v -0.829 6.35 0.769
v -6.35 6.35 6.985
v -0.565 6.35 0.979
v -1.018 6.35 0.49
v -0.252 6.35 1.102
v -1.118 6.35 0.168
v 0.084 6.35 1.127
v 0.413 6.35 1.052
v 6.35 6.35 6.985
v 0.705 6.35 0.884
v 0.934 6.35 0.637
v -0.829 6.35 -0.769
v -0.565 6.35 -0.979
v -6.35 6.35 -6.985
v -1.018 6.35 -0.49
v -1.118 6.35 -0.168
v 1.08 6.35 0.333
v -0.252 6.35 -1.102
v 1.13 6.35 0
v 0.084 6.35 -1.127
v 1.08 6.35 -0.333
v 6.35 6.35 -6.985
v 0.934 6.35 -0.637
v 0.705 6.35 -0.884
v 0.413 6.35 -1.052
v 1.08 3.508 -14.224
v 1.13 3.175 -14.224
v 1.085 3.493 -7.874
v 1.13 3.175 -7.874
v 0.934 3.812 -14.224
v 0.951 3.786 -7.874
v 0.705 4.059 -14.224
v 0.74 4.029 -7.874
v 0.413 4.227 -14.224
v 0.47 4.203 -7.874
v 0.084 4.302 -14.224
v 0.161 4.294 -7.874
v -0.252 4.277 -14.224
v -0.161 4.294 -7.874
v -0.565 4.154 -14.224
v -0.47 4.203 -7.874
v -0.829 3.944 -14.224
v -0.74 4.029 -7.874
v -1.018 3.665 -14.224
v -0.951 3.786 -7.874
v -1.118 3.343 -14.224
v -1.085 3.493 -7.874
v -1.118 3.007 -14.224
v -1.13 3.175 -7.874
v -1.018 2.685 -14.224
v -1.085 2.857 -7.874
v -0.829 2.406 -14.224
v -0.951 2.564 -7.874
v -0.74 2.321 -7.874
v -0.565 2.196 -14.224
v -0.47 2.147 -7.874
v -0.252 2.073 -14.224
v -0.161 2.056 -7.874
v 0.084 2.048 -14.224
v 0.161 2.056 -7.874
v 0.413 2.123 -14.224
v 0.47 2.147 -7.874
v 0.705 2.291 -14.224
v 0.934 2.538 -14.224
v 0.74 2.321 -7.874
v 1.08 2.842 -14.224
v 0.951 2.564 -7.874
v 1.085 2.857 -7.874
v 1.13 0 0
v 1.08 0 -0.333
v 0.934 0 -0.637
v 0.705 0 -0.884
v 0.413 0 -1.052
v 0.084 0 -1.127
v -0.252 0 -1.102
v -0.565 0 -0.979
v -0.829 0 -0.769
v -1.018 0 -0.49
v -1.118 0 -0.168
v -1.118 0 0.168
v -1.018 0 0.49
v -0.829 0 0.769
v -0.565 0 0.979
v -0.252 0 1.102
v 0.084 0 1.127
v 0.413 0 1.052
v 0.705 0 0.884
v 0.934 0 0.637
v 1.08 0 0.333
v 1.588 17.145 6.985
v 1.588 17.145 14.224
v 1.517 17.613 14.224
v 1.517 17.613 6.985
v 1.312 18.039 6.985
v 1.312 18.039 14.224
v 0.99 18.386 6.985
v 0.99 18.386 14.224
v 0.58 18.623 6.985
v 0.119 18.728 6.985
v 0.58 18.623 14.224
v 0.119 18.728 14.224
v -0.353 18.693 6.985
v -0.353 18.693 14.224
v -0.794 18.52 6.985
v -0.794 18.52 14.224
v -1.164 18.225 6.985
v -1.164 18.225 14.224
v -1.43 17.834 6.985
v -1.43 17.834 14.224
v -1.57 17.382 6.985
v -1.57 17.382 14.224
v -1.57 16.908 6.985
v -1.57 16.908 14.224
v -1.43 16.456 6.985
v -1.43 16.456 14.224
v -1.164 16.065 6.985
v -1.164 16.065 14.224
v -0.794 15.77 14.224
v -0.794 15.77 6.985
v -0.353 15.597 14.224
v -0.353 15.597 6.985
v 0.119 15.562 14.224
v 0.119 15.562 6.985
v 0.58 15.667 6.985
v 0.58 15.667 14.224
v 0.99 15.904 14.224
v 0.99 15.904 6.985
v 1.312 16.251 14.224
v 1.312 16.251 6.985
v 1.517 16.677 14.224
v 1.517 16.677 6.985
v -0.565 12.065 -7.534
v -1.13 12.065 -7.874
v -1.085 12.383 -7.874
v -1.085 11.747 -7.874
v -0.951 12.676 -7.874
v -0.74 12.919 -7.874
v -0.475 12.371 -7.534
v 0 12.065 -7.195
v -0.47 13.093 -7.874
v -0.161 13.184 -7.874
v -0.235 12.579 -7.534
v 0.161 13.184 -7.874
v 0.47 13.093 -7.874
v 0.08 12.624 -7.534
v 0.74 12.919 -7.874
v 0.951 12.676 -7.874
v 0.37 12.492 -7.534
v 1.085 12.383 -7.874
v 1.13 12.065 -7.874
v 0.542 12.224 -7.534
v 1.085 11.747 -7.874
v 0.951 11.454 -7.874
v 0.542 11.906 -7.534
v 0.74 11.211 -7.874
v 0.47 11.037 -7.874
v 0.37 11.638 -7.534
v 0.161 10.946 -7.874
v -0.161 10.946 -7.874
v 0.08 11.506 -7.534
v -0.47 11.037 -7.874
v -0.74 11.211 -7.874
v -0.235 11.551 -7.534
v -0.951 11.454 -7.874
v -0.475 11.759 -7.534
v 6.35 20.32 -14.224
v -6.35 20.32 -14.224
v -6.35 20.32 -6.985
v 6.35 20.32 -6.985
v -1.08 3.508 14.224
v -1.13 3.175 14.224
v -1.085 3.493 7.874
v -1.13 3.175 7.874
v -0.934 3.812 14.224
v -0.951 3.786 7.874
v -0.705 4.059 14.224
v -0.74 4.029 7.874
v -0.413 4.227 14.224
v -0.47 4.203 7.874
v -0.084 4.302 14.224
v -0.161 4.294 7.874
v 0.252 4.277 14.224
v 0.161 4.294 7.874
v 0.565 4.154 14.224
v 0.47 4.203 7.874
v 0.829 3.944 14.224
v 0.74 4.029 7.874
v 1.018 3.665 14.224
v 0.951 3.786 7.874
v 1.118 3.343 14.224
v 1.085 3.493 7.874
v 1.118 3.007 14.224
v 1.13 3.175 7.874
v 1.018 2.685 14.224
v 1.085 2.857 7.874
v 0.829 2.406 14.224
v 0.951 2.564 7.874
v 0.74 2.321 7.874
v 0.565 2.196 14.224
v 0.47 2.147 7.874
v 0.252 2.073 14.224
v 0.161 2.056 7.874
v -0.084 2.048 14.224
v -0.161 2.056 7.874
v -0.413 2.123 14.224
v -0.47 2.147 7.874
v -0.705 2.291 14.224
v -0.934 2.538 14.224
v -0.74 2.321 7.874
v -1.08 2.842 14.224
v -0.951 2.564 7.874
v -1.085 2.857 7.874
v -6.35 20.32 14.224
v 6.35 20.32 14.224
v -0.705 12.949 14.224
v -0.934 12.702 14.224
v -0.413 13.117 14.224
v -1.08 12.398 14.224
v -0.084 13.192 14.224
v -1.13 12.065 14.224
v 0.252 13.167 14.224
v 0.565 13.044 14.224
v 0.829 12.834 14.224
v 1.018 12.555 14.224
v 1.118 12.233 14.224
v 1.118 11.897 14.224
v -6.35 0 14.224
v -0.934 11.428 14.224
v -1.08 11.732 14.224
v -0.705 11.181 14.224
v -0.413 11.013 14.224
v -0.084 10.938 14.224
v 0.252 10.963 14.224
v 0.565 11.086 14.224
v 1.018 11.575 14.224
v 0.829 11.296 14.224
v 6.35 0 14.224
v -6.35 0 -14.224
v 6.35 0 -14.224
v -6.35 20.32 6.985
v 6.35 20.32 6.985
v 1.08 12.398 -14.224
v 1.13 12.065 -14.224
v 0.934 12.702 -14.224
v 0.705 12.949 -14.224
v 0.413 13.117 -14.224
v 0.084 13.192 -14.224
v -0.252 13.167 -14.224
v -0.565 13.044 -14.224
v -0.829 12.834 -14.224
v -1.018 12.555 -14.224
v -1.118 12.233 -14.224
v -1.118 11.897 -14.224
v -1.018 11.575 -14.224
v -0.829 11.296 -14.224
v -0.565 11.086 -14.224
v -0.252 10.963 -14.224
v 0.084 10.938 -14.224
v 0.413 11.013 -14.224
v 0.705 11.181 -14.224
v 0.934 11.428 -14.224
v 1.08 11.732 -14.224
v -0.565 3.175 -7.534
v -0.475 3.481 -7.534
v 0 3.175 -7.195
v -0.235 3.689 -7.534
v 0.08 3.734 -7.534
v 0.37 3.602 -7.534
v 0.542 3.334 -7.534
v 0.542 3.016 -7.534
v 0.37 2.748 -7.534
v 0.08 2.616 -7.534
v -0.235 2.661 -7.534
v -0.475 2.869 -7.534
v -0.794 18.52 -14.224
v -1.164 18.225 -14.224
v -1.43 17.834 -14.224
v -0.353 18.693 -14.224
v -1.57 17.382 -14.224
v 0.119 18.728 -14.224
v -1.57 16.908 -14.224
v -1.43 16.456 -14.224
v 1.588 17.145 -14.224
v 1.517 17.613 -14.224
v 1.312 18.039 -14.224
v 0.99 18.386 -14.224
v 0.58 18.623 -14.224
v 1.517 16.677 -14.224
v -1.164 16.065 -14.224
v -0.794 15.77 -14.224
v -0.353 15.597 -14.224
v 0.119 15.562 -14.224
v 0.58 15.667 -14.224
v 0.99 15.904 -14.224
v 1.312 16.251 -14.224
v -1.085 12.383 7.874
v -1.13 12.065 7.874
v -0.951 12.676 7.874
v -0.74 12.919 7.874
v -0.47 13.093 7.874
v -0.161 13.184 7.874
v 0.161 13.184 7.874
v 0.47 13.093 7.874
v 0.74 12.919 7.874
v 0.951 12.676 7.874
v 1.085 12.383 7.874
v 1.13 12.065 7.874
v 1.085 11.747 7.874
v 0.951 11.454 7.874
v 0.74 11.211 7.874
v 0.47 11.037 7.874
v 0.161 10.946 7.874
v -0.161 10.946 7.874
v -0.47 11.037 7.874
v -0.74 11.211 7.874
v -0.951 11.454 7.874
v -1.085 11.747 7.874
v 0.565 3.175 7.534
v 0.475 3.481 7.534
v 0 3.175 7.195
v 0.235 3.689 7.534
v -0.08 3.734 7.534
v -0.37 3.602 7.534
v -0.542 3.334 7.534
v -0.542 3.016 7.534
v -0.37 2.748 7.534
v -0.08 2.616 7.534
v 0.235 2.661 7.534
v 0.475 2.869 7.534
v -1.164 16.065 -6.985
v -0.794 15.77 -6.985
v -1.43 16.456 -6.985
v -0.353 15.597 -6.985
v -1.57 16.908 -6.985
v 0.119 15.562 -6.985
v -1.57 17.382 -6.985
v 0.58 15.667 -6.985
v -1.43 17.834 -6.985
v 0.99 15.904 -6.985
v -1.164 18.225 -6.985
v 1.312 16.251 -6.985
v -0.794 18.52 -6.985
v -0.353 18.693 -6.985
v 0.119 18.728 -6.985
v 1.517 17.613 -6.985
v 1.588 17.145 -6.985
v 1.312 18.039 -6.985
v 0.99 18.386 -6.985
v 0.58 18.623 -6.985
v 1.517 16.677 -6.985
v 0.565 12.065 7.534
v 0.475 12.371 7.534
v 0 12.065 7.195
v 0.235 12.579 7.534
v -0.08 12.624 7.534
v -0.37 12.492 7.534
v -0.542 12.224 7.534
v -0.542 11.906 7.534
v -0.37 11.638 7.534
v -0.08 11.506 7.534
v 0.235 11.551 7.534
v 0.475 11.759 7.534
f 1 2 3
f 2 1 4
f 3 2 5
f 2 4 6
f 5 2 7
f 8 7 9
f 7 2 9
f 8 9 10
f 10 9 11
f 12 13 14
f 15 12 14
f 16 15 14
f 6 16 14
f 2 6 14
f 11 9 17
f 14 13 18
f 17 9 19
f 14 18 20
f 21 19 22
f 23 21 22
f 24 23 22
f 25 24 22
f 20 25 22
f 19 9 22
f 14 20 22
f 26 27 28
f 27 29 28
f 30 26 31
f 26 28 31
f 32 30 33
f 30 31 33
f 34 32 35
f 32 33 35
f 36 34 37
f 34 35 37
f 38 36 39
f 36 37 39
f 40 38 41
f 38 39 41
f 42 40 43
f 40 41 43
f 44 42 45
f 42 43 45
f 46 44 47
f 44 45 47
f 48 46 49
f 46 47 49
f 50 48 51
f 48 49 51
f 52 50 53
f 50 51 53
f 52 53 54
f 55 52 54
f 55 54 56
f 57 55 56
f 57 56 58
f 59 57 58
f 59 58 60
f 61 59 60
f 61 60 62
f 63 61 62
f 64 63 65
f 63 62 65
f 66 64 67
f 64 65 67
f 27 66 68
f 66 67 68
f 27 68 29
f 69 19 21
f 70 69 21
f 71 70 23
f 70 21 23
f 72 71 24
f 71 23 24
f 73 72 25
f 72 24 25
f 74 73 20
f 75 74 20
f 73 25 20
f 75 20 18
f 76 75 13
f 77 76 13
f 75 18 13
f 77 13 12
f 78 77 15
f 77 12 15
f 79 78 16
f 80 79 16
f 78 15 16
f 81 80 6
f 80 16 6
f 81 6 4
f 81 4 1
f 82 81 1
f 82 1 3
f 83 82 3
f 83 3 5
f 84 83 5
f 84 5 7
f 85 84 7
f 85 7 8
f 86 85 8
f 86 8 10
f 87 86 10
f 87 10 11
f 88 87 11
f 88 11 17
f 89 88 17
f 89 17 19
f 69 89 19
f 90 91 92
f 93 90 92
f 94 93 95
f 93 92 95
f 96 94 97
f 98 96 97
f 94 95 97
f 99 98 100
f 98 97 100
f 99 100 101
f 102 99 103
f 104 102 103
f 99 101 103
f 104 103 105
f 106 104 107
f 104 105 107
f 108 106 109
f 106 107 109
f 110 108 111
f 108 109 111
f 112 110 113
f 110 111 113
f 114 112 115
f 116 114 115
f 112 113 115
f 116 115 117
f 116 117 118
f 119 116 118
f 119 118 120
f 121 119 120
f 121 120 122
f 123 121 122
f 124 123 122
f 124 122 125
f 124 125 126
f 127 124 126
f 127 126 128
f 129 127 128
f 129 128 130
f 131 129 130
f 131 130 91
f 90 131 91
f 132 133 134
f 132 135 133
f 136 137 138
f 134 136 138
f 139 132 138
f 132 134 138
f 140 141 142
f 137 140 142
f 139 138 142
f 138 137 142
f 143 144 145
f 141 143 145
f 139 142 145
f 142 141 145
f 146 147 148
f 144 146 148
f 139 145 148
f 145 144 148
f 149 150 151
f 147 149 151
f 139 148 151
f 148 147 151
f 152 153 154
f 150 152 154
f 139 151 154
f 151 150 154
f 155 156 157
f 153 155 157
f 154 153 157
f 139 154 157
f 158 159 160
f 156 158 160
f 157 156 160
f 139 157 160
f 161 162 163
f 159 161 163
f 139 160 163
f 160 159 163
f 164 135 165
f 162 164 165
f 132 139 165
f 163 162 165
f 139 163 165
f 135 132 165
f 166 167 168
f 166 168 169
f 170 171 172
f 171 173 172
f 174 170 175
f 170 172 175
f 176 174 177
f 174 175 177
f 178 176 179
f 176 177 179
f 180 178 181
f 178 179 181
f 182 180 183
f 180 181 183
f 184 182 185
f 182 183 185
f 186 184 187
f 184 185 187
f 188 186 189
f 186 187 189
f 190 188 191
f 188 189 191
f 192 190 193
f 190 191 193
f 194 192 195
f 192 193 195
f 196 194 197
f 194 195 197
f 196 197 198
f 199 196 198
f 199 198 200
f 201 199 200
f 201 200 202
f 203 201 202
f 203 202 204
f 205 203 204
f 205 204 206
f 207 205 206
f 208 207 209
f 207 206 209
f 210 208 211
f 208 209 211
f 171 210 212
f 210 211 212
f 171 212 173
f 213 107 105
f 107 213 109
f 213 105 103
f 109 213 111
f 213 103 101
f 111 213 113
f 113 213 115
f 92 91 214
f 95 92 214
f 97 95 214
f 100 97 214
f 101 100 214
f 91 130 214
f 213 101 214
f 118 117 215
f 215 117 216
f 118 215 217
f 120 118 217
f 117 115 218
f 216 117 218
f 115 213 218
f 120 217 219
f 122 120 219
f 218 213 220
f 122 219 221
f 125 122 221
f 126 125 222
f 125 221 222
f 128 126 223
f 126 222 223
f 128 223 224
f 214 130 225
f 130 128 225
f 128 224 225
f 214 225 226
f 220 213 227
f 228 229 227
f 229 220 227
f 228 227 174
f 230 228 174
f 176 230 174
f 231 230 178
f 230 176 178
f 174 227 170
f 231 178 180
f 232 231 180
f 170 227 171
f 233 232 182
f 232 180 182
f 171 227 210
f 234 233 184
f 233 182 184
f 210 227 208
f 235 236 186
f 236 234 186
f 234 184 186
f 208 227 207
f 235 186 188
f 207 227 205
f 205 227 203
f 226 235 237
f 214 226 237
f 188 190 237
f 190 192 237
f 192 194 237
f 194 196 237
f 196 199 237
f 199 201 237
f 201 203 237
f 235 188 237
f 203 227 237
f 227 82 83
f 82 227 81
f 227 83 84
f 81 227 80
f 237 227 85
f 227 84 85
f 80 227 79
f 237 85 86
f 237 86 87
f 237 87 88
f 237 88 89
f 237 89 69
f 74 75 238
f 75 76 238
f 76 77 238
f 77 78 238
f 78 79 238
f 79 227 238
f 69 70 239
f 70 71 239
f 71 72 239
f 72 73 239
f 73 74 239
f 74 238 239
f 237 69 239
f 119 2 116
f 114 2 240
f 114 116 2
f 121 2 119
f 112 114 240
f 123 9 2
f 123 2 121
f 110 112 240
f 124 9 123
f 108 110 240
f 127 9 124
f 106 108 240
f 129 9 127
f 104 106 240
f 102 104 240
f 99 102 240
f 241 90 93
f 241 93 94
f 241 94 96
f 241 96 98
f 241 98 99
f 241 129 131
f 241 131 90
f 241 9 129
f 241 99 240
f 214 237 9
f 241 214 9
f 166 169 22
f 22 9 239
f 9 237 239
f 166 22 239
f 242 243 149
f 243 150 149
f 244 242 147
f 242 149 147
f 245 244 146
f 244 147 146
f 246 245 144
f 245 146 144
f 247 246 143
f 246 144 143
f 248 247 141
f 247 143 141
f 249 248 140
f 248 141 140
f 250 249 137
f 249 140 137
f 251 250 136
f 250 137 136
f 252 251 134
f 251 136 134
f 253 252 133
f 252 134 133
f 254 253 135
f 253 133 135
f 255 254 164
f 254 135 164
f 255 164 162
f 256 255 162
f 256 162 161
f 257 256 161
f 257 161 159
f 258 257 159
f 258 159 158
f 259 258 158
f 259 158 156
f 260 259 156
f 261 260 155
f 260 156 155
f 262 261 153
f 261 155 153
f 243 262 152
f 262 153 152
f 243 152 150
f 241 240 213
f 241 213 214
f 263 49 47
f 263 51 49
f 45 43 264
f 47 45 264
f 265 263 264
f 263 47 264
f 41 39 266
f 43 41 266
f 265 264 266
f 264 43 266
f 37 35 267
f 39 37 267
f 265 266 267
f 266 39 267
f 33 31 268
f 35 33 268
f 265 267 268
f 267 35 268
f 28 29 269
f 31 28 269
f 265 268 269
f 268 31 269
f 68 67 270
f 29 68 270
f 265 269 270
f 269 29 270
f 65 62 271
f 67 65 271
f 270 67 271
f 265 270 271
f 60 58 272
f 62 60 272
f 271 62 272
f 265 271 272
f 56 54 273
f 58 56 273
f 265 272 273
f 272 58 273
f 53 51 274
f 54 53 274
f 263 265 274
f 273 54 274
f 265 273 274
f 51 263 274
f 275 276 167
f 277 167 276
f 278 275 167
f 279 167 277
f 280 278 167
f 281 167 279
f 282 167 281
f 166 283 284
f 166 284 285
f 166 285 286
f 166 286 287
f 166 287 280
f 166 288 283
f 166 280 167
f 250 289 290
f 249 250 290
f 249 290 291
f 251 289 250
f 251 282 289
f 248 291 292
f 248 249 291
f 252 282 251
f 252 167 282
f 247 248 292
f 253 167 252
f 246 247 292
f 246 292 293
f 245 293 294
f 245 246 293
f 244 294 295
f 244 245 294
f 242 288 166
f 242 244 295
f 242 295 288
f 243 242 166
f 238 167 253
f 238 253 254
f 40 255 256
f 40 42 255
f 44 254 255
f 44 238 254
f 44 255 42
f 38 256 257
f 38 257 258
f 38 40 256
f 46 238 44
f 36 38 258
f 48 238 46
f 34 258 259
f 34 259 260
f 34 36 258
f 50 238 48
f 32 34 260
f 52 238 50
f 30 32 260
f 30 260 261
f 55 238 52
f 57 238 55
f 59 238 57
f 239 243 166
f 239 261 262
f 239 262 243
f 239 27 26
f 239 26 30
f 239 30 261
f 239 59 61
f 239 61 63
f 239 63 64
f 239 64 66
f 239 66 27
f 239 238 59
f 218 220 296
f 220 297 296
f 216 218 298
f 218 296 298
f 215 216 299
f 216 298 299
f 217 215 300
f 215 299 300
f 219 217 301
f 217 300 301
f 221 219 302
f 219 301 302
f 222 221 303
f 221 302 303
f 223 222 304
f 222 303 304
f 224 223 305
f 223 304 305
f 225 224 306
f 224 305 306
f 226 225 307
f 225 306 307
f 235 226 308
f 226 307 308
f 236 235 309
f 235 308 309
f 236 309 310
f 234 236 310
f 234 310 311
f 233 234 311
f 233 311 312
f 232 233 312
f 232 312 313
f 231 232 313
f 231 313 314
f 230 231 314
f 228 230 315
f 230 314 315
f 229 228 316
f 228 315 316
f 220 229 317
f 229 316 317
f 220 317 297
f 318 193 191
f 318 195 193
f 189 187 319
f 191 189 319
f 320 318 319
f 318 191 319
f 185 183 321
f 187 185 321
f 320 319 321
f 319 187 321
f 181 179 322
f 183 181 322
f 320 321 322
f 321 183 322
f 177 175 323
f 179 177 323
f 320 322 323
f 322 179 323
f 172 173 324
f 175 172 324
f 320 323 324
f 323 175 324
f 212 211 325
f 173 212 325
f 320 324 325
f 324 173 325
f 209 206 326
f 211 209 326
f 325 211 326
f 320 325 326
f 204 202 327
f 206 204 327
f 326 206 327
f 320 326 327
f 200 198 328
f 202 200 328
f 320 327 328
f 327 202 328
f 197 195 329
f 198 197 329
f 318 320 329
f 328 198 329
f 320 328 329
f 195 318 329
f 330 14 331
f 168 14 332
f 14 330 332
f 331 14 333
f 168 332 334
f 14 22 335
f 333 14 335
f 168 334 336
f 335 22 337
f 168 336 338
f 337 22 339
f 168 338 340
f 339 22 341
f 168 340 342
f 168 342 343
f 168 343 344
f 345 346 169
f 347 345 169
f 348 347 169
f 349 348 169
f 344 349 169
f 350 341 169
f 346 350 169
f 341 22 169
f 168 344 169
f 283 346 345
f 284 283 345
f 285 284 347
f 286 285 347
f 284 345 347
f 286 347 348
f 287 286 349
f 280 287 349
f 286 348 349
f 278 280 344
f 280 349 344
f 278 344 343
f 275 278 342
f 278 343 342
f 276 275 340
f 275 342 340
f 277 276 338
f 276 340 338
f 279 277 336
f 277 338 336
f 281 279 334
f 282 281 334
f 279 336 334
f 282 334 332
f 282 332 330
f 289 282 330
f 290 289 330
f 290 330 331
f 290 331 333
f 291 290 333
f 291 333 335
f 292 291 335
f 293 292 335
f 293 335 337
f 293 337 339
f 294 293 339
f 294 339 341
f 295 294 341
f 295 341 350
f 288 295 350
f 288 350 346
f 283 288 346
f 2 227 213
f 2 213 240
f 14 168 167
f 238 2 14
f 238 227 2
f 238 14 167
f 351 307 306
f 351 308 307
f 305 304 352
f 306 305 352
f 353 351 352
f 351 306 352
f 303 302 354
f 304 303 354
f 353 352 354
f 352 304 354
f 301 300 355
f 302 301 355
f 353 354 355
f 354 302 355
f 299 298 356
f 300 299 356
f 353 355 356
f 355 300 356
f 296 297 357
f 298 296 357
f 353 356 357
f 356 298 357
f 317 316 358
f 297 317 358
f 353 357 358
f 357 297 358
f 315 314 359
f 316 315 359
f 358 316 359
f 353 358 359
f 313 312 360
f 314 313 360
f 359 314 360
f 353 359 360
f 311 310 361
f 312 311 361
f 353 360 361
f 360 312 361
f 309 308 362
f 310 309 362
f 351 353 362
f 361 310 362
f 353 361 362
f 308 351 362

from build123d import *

# Parameters (mm, degrees)
SKETCH1_W                 = 12.7
SKETCH1_H                 = 28.448
BOSS_EXTRUDE1_DEPTH       = 20.32
SKETCH2_W                 = 13.97
SKETCH2_H                 = 13.97
CUT_EXTRUDE1_DEPTH        = 28.866011125
SKETCH5_R                 = 1.5875
CUT_EXTRUDE2_DEPTH        = 36.531867443
F_4_40_TAPPED_HOLE1_D     = 2.2606
F_4_40_TAPPED_HOLE2_D     = 2.2606
F_4_40_TAPPED_HOLE2_DEPTH = 6.35
F_4_40_TAPPED_HOLE2_TIP   = 0.679152758
F_4_40_TAPPED_HOLE3_D     = 2.2606
F_4_40_TAPPED_HOLE3_DEPTH = 6.35
F_4_40_TAPPED_HOLE3_TIP   = 0.679152758


with BuildPart() as part:
    # Sketch1 → Boss-Extrude1 (new body)
    with BuildSketch(Plane(origin=(0, 0, 0), x_dir=(1, 0, 0), z_dir=(0, 1, 0))):
        Rectangle(SKETCH1_W, SKETCH1_H)
    extrude(amount=BOSS_EXTRUDE1_DEPTH)

    # Sketch2 → Cut-Extrude1 (cut, through all)
    with BuildSketch(Plane(origin=(6.35, 0, 0), x_dir=(0, 0, -1), z_dir=(1, 0, 0))):
        with Locations((0, 13.335)):
            Rectangle(SKETCH2_W, SKETCH2_H)
    extrude(amount=-CUT_EXTRUDE1_DEPTH, mode=Mode.SUBTRACT)

    # Sketch5 → Cut-Extrude2 (cut, through all)
    with BuildSketch(Plane.XY.offset(14.224)):
        with Locations((0, 17.145)):
            Circle(SKETCH5_R)
    extrude(amount=-CUT_EXTRUDE2_DEPTH, mode=Mode.SUBTRACT)

    # #4-40 Tapped Hole1 (through all)
    with Locations(Plane(origin=(0, 0, 0), x_dir=(-1, 0, 0), z_dir=(0, -1, 0))):
        with Locations((0, 0)):
            Hole(F_4_40_TAPPED_HOLE1_D / 2)

    # #4-40 Tapped Hole2
    with Locations(Plane(origin=(0, 0, -14.224), x_dir=(-1, 0, 0), z_dir=(0, 0, -1))):
        with Locations((0, 12.065), (0, 3.175)):
            Hole(F_4_40_TAPPED_HOLE2_D / 2, depth=F_4_40_TAPPED_HOLE2_DEPTH)
            with Locations((0, 0, -(F_4_40_TAPPED_HOLE2_DEPTH + F_4_40_TAPPED_HOLE2_TIP / 2))):  # 118° drill point
                Cone(0, F_4_40_TAPPED_HOLE2_D / 2, F_4_40_TAPPED_HOLE2_TIP, mode=Mode.SUBTRACT)

    # #4-40 Tapped Hole3
    with Locations(Plane.XY.offset(14.224)):
        with Locations((0, 12.065), (0, 3.175)):
            Hole(F_4_40_TAPPED_HOLE3_D / 2, depth=F_4_40_TAPPED_HOLE3_DEPTH)
            with Locations((0, 0, -(F_4_40_TAPPED_HOLE3_DEPTH + F_4_40_TAPPED_HOLE3_TIP / 2))):  # 118° drill point
                Cone(0, F_4_40_TAPPED_HOLE3_D / 2, F_4_40_TAPPED_HOLE3_TIP, mode=Mode.SUBTRACT)


solid = part.part
